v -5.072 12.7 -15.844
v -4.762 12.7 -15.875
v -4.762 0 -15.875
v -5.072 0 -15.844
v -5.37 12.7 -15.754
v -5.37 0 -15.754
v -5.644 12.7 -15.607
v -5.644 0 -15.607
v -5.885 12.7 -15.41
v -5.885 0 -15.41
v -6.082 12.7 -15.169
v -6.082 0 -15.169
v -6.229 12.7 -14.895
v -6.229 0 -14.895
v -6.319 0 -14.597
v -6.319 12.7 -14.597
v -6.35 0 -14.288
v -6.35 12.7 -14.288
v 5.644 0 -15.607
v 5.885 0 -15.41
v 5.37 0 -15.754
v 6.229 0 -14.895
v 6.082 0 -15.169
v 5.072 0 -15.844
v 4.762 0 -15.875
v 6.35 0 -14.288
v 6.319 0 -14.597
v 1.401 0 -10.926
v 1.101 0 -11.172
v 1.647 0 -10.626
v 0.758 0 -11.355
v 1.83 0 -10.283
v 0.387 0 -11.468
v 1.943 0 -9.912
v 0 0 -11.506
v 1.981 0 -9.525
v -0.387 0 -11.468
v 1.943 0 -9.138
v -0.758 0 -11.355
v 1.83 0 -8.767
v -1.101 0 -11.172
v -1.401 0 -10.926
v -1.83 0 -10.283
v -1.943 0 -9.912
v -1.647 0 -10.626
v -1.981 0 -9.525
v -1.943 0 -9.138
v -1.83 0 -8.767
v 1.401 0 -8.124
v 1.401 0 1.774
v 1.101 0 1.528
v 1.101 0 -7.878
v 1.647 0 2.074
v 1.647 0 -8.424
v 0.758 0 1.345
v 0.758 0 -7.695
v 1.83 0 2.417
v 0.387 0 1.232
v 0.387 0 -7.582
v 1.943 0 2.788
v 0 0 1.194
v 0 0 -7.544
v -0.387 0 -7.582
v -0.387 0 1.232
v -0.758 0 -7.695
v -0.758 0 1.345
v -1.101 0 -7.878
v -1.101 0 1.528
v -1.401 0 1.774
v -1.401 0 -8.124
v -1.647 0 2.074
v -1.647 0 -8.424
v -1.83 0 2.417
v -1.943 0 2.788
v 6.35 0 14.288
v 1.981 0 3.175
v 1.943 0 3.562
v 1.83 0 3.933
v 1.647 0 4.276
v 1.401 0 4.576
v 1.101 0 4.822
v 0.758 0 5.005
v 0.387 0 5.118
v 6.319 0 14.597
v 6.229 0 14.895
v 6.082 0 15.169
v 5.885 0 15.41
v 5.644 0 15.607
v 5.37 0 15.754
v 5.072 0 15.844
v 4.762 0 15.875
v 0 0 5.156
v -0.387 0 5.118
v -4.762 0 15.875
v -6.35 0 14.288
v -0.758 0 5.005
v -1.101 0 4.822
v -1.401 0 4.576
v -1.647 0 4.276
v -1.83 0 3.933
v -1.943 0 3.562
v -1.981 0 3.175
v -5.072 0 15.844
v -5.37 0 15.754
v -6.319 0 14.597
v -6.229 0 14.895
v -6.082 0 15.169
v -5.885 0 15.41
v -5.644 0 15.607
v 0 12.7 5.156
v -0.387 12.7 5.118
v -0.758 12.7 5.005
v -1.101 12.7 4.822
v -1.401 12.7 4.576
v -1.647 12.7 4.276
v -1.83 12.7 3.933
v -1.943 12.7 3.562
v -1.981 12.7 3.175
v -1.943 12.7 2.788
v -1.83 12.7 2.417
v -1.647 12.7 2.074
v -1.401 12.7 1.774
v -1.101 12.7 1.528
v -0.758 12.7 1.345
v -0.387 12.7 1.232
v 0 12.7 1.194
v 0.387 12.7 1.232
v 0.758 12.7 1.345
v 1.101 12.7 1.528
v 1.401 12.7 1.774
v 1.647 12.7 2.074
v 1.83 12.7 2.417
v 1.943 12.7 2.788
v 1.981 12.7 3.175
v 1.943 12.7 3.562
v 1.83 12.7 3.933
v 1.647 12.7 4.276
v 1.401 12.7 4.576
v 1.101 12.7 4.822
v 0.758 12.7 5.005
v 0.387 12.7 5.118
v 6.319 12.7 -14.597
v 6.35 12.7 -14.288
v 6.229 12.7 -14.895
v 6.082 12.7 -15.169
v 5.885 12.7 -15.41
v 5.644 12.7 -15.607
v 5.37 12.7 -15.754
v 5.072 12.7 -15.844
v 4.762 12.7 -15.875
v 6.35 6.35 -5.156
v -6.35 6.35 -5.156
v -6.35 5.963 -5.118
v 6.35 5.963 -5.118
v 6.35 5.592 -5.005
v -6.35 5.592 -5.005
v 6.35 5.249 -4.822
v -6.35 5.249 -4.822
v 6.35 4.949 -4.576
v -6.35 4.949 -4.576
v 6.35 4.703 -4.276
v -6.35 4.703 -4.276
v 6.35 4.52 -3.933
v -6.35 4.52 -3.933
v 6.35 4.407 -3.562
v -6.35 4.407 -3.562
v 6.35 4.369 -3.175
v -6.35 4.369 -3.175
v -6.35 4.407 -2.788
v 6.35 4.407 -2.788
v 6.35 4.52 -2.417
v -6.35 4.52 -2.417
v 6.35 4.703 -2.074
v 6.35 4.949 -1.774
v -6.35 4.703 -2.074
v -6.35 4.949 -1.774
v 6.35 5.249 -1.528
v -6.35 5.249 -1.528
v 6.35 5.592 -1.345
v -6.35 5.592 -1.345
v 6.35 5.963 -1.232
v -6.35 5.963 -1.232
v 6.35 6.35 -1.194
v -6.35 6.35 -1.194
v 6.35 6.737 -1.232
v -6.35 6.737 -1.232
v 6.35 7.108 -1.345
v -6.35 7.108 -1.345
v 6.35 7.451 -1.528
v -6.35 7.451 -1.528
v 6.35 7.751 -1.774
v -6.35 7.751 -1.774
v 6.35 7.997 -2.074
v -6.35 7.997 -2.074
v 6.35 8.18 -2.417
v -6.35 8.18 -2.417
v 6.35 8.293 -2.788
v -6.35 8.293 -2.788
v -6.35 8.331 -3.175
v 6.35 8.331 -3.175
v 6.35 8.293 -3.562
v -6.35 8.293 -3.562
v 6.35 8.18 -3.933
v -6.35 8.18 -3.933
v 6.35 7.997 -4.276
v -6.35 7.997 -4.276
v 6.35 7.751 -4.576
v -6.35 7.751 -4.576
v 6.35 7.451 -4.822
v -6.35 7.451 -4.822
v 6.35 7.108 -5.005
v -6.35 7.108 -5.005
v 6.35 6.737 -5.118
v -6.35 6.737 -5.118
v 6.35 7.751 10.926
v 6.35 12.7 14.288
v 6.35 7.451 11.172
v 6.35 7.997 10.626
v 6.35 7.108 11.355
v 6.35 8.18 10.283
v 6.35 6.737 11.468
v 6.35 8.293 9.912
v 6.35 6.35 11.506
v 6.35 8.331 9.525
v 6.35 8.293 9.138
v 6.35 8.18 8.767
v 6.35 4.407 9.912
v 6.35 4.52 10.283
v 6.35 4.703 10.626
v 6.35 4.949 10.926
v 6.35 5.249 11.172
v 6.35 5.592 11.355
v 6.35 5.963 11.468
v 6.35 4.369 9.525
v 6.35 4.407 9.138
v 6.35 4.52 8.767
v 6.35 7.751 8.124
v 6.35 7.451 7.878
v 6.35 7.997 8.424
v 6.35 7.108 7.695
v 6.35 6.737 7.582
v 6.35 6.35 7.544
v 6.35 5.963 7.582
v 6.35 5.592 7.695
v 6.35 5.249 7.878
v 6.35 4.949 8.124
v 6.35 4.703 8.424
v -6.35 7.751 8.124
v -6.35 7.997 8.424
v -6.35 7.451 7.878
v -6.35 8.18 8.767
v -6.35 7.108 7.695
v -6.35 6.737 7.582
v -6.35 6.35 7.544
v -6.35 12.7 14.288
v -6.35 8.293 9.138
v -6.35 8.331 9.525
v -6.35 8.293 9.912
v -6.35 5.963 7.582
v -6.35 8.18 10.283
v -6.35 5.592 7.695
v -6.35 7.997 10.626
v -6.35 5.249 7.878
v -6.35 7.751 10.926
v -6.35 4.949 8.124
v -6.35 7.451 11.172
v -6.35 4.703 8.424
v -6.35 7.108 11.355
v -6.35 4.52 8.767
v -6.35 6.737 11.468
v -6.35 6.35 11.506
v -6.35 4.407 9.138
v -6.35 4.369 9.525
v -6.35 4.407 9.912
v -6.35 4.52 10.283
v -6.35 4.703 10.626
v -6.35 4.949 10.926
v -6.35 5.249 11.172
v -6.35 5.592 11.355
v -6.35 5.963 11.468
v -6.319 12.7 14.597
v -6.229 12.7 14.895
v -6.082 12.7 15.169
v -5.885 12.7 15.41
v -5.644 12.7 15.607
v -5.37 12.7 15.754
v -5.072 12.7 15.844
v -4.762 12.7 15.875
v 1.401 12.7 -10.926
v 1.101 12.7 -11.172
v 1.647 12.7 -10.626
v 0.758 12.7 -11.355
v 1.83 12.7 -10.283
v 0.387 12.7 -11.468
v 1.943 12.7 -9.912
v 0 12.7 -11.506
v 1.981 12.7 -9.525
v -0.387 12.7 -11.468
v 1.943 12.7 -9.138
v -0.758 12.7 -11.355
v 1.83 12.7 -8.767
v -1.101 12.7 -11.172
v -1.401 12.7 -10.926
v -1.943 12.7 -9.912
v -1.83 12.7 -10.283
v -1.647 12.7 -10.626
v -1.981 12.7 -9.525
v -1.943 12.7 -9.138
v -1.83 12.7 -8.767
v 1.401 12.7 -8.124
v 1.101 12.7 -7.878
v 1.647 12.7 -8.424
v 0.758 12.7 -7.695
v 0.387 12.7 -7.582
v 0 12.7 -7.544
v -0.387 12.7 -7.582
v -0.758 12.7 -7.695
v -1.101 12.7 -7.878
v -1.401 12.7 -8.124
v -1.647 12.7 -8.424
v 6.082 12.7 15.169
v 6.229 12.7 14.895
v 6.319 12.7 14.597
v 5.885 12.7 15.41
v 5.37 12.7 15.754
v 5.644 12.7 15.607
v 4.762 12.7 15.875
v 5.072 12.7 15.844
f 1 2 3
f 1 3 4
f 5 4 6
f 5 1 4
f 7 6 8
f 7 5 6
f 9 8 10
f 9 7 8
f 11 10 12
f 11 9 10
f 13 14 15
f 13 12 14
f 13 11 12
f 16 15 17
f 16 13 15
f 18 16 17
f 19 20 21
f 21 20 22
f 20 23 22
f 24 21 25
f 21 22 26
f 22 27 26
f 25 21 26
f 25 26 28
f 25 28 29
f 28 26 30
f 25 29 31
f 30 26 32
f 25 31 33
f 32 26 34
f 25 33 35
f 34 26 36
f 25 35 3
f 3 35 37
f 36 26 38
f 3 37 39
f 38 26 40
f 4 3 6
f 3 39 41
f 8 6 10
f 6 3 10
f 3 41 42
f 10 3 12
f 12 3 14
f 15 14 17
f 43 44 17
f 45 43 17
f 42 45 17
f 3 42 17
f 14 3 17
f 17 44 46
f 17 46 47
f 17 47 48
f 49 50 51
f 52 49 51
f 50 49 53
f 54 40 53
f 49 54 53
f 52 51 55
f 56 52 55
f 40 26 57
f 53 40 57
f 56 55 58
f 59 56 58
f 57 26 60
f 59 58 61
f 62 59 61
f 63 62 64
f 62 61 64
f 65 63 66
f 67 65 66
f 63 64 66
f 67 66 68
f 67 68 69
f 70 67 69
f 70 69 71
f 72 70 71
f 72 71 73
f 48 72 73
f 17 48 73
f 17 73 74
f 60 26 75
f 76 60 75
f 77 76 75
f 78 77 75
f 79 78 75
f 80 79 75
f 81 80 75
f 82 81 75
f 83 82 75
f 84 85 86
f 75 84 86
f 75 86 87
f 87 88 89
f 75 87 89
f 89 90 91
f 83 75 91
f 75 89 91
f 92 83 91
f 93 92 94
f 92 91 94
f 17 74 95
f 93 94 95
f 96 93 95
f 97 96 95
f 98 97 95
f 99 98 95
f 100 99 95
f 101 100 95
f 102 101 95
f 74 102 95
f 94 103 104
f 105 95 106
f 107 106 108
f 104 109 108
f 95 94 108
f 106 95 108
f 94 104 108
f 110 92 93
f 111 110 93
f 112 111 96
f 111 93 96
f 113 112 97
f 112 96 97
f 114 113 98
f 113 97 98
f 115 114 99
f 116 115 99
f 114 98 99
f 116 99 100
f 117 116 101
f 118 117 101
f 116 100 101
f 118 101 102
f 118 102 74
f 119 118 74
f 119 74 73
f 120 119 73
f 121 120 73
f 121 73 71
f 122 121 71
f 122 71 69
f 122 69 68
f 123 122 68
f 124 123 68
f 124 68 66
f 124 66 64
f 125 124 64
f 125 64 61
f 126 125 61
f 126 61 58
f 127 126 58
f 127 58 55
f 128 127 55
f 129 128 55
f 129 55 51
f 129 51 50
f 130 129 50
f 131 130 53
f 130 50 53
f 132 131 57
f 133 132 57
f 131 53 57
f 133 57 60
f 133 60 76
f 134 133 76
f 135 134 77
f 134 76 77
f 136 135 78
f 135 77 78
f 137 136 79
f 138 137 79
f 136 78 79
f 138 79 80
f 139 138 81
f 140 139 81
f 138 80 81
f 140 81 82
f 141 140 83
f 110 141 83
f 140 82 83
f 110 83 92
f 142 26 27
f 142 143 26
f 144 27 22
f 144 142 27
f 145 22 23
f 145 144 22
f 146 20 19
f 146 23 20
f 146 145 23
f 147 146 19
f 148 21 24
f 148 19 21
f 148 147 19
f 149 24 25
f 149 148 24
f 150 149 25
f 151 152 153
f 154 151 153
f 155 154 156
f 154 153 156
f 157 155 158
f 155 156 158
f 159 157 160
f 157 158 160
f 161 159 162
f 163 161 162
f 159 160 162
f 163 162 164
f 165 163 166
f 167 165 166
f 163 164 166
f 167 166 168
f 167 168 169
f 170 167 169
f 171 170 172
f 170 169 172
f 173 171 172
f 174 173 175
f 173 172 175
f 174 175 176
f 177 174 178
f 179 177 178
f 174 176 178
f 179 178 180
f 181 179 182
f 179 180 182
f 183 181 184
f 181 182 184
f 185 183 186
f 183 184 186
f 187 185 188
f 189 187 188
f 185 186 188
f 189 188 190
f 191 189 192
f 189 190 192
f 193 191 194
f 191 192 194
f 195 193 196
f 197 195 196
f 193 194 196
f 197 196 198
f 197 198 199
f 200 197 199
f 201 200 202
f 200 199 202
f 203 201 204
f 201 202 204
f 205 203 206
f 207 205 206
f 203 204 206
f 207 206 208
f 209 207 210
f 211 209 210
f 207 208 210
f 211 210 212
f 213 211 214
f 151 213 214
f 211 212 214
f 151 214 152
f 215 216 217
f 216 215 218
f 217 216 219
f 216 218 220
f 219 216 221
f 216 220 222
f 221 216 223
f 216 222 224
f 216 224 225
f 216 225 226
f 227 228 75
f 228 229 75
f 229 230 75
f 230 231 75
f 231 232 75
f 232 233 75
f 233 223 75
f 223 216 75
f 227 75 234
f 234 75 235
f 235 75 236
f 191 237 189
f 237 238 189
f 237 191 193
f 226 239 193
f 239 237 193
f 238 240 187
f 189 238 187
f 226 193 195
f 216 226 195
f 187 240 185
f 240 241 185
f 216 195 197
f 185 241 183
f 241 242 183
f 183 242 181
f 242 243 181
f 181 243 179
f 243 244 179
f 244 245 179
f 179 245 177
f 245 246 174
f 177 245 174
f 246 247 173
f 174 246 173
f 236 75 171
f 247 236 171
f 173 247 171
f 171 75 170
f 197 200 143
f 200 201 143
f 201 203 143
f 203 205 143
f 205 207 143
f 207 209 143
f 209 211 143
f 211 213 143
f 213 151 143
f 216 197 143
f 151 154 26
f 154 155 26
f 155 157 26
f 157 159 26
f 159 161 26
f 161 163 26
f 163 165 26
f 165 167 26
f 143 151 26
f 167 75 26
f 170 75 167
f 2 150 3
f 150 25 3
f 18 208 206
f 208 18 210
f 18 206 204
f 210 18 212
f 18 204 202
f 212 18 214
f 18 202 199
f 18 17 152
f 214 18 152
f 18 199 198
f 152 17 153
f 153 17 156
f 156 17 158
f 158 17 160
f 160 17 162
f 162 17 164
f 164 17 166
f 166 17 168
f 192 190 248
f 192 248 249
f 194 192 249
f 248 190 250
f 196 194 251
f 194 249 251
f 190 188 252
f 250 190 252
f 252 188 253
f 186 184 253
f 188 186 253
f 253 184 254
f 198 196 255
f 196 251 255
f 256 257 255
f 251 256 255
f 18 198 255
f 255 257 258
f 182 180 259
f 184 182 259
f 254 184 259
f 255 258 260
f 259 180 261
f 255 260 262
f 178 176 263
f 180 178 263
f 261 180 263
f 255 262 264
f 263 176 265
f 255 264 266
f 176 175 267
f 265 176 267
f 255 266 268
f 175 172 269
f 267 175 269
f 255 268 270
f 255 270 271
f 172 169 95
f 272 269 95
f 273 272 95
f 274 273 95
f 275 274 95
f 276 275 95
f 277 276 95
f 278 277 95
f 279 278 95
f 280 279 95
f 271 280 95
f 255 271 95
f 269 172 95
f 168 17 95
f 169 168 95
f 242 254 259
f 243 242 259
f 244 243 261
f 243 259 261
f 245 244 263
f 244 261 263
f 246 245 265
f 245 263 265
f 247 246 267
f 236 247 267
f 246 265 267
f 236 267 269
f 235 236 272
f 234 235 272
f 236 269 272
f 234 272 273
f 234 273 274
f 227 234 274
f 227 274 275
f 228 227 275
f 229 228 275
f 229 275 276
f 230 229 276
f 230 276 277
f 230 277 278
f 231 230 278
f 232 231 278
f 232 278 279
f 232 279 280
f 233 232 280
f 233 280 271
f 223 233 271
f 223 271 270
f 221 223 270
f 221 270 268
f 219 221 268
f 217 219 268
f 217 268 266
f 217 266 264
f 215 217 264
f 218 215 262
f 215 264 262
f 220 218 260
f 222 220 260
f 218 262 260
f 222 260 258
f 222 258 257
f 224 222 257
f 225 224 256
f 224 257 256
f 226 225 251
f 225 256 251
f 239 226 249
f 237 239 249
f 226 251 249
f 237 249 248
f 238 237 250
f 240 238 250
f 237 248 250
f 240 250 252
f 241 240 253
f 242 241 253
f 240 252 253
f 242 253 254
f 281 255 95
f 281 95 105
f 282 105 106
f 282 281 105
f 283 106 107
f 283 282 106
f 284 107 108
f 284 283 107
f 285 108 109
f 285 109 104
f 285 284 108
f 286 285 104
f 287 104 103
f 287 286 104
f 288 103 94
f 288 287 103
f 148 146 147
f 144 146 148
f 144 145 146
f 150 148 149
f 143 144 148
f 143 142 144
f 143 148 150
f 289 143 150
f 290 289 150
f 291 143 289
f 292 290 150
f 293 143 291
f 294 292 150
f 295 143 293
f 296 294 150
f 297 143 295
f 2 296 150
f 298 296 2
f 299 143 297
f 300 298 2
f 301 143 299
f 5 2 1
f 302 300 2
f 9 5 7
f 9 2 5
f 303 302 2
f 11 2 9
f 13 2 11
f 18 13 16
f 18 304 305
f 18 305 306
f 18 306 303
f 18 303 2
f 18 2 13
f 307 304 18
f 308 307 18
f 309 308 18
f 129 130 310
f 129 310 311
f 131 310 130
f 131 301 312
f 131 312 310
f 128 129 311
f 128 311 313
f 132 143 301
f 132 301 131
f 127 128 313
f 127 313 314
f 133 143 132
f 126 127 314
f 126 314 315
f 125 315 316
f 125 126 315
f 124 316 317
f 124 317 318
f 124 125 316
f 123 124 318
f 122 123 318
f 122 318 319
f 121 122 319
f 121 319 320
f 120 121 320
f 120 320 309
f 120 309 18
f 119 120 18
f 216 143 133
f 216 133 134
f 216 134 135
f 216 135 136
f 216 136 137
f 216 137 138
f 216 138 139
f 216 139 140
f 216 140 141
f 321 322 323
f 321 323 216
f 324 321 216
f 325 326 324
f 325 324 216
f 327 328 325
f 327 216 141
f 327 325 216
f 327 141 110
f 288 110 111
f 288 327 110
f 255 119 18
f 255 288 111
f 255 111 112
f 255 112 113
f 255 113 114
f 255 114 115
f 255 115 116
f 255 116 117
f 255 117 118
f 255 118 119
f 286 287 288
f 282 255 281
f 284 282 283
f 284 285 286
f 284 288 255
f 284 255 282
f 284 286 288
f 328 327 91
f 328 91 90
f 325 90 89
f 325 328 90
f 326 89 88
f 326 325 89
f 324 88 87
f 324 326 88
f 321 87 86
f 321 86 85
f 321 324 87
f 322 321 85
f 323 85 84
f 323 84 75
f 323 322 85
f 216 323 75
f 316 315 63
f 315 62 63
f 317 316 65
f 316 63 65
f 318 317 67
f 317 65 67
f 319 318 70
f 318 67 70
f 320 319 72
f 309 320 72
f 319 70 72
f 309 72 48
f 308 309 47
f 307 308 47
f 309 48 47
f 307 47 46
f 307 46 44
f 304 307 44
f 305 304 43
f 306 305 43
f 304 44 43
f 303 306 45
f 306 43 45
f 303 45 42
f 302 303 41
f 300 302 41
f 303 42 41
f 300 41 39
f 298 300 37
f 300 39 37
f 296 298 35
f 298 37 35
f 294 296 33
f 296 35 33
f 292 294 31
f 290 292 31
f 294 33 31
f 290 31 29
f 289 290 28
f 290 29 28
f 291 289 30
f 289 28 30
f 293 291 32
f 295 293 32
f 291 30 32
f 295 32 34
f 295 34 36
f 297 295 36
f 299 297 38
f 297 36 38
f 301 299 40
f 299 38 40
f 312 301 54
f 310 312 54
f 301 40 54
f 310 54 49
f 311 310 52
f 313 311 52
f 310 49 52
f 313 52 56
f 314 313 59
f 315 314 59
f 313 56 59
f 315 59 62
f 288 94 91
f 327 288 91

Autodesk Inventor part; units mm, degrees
ref_plane "YZ Plane" through (0, 0, 0) normal (1, 0, 0) x (0, 1, 0)
ref_plane "XZ Plane" through (0, 0, 0) normal (0, 1, 0) x (-1, 0, 0)
ref_plane "XY Plane" through (0, 0, 0) normal (0, 0, 1) x (1, 0, 0)
sketch "Sketch1" plane through (0, 0, 0) normal (0, 1, 0) x (-1, 0, 0)
  line L0 (6.35, 15.875) -> (-6.35, 15.875)
  line L1 (-6.35, 15.875) -> (-6.35, -15.875)
  line L2 (-6.35, -15.875) -> (6.35, -15.875)
  line L3 (6.35, -15.875) -> (6.35, 15.875)
  line L4 (6.35, 15.875) -> (-6.35, -15.875) construction
  line L5 (-6.35, 15.875) -> (6.35, -15.875) construction
  point P0 (0, 0)
  dimension "d0" = 31.75
  dimension "d1" = 12.7
extrude "Plate1" add sketch "Sketch1" along normal blind 12.7
sketch "Sketch2" plane through (6.35, 0, 15.875) normal (1, 0, 0) x (0, 0, -1)
  line L0 (0, 0) -> (0, 12.7) construction
  point P0 (15.875, 0)
  point P1 (6.35, 6.35)
  point P2 (19.05, 6.35)
  point P3 (0, 6.35)
  dimension "d3" = 12.7
  dimension "d4" = 6.35
hole "Hole1" at (6.35, 6.35, 9.525) at (6.35, 6.35, -3.175) direction (-1, 0, 0) diameter 3.9624 end through all thread size "10-32 UNF" class "2B" standard "ANSI Unified Screw Threads"
sketch "Sketch3" plane through (0, 12.7, 0) normal (0, 1, 0) x (1, 0, 0)
  point P0 (0, 0)
  point P1 (0, -3.175)
  point P2 (0, 9.525)
  dimension "d12" = 12.7
  dimension "d13" = 3.175
hole "Hole2" at (0, 12.7, 3.175) at (0, 12.7, -9.525) direction (0, -1, 0) diameter 3.9624 end through all thread size "10-32 UNF" class "2B" standard "ANSI Unified Screw Threads"
fillet "Corner Round1" radius 1.5875 4 edges at (6.35, 6.35, 15.875) (-6.35, 6.35, 15.875) (-6.35, 6.35, -15.875) (6.35, 6.35, -15.875)
equation "\"d2\" = Thickness"
equation "\"BendRadius\" = Thickness"
equation "\"BendReliefWidth\" = Thickness"
equation "\"BendReliefDepth\" = 0.5 * Thickness"
equation "\"CornerReliefSize\" = 4 * Thickness"
equation "\"MinimumRemnant\" = 2 * Thickness"
equation "\"TransitionRadius\" = BendRadius"
equation "\"JacobiRadiusSize\" = BendRadius"
equation "\"GapSize\" = Thickness"
equation "\"Thickness\" = 12.7"
properties part number "PLATE,NUTBLOCK" material "Aluminum 6061"
